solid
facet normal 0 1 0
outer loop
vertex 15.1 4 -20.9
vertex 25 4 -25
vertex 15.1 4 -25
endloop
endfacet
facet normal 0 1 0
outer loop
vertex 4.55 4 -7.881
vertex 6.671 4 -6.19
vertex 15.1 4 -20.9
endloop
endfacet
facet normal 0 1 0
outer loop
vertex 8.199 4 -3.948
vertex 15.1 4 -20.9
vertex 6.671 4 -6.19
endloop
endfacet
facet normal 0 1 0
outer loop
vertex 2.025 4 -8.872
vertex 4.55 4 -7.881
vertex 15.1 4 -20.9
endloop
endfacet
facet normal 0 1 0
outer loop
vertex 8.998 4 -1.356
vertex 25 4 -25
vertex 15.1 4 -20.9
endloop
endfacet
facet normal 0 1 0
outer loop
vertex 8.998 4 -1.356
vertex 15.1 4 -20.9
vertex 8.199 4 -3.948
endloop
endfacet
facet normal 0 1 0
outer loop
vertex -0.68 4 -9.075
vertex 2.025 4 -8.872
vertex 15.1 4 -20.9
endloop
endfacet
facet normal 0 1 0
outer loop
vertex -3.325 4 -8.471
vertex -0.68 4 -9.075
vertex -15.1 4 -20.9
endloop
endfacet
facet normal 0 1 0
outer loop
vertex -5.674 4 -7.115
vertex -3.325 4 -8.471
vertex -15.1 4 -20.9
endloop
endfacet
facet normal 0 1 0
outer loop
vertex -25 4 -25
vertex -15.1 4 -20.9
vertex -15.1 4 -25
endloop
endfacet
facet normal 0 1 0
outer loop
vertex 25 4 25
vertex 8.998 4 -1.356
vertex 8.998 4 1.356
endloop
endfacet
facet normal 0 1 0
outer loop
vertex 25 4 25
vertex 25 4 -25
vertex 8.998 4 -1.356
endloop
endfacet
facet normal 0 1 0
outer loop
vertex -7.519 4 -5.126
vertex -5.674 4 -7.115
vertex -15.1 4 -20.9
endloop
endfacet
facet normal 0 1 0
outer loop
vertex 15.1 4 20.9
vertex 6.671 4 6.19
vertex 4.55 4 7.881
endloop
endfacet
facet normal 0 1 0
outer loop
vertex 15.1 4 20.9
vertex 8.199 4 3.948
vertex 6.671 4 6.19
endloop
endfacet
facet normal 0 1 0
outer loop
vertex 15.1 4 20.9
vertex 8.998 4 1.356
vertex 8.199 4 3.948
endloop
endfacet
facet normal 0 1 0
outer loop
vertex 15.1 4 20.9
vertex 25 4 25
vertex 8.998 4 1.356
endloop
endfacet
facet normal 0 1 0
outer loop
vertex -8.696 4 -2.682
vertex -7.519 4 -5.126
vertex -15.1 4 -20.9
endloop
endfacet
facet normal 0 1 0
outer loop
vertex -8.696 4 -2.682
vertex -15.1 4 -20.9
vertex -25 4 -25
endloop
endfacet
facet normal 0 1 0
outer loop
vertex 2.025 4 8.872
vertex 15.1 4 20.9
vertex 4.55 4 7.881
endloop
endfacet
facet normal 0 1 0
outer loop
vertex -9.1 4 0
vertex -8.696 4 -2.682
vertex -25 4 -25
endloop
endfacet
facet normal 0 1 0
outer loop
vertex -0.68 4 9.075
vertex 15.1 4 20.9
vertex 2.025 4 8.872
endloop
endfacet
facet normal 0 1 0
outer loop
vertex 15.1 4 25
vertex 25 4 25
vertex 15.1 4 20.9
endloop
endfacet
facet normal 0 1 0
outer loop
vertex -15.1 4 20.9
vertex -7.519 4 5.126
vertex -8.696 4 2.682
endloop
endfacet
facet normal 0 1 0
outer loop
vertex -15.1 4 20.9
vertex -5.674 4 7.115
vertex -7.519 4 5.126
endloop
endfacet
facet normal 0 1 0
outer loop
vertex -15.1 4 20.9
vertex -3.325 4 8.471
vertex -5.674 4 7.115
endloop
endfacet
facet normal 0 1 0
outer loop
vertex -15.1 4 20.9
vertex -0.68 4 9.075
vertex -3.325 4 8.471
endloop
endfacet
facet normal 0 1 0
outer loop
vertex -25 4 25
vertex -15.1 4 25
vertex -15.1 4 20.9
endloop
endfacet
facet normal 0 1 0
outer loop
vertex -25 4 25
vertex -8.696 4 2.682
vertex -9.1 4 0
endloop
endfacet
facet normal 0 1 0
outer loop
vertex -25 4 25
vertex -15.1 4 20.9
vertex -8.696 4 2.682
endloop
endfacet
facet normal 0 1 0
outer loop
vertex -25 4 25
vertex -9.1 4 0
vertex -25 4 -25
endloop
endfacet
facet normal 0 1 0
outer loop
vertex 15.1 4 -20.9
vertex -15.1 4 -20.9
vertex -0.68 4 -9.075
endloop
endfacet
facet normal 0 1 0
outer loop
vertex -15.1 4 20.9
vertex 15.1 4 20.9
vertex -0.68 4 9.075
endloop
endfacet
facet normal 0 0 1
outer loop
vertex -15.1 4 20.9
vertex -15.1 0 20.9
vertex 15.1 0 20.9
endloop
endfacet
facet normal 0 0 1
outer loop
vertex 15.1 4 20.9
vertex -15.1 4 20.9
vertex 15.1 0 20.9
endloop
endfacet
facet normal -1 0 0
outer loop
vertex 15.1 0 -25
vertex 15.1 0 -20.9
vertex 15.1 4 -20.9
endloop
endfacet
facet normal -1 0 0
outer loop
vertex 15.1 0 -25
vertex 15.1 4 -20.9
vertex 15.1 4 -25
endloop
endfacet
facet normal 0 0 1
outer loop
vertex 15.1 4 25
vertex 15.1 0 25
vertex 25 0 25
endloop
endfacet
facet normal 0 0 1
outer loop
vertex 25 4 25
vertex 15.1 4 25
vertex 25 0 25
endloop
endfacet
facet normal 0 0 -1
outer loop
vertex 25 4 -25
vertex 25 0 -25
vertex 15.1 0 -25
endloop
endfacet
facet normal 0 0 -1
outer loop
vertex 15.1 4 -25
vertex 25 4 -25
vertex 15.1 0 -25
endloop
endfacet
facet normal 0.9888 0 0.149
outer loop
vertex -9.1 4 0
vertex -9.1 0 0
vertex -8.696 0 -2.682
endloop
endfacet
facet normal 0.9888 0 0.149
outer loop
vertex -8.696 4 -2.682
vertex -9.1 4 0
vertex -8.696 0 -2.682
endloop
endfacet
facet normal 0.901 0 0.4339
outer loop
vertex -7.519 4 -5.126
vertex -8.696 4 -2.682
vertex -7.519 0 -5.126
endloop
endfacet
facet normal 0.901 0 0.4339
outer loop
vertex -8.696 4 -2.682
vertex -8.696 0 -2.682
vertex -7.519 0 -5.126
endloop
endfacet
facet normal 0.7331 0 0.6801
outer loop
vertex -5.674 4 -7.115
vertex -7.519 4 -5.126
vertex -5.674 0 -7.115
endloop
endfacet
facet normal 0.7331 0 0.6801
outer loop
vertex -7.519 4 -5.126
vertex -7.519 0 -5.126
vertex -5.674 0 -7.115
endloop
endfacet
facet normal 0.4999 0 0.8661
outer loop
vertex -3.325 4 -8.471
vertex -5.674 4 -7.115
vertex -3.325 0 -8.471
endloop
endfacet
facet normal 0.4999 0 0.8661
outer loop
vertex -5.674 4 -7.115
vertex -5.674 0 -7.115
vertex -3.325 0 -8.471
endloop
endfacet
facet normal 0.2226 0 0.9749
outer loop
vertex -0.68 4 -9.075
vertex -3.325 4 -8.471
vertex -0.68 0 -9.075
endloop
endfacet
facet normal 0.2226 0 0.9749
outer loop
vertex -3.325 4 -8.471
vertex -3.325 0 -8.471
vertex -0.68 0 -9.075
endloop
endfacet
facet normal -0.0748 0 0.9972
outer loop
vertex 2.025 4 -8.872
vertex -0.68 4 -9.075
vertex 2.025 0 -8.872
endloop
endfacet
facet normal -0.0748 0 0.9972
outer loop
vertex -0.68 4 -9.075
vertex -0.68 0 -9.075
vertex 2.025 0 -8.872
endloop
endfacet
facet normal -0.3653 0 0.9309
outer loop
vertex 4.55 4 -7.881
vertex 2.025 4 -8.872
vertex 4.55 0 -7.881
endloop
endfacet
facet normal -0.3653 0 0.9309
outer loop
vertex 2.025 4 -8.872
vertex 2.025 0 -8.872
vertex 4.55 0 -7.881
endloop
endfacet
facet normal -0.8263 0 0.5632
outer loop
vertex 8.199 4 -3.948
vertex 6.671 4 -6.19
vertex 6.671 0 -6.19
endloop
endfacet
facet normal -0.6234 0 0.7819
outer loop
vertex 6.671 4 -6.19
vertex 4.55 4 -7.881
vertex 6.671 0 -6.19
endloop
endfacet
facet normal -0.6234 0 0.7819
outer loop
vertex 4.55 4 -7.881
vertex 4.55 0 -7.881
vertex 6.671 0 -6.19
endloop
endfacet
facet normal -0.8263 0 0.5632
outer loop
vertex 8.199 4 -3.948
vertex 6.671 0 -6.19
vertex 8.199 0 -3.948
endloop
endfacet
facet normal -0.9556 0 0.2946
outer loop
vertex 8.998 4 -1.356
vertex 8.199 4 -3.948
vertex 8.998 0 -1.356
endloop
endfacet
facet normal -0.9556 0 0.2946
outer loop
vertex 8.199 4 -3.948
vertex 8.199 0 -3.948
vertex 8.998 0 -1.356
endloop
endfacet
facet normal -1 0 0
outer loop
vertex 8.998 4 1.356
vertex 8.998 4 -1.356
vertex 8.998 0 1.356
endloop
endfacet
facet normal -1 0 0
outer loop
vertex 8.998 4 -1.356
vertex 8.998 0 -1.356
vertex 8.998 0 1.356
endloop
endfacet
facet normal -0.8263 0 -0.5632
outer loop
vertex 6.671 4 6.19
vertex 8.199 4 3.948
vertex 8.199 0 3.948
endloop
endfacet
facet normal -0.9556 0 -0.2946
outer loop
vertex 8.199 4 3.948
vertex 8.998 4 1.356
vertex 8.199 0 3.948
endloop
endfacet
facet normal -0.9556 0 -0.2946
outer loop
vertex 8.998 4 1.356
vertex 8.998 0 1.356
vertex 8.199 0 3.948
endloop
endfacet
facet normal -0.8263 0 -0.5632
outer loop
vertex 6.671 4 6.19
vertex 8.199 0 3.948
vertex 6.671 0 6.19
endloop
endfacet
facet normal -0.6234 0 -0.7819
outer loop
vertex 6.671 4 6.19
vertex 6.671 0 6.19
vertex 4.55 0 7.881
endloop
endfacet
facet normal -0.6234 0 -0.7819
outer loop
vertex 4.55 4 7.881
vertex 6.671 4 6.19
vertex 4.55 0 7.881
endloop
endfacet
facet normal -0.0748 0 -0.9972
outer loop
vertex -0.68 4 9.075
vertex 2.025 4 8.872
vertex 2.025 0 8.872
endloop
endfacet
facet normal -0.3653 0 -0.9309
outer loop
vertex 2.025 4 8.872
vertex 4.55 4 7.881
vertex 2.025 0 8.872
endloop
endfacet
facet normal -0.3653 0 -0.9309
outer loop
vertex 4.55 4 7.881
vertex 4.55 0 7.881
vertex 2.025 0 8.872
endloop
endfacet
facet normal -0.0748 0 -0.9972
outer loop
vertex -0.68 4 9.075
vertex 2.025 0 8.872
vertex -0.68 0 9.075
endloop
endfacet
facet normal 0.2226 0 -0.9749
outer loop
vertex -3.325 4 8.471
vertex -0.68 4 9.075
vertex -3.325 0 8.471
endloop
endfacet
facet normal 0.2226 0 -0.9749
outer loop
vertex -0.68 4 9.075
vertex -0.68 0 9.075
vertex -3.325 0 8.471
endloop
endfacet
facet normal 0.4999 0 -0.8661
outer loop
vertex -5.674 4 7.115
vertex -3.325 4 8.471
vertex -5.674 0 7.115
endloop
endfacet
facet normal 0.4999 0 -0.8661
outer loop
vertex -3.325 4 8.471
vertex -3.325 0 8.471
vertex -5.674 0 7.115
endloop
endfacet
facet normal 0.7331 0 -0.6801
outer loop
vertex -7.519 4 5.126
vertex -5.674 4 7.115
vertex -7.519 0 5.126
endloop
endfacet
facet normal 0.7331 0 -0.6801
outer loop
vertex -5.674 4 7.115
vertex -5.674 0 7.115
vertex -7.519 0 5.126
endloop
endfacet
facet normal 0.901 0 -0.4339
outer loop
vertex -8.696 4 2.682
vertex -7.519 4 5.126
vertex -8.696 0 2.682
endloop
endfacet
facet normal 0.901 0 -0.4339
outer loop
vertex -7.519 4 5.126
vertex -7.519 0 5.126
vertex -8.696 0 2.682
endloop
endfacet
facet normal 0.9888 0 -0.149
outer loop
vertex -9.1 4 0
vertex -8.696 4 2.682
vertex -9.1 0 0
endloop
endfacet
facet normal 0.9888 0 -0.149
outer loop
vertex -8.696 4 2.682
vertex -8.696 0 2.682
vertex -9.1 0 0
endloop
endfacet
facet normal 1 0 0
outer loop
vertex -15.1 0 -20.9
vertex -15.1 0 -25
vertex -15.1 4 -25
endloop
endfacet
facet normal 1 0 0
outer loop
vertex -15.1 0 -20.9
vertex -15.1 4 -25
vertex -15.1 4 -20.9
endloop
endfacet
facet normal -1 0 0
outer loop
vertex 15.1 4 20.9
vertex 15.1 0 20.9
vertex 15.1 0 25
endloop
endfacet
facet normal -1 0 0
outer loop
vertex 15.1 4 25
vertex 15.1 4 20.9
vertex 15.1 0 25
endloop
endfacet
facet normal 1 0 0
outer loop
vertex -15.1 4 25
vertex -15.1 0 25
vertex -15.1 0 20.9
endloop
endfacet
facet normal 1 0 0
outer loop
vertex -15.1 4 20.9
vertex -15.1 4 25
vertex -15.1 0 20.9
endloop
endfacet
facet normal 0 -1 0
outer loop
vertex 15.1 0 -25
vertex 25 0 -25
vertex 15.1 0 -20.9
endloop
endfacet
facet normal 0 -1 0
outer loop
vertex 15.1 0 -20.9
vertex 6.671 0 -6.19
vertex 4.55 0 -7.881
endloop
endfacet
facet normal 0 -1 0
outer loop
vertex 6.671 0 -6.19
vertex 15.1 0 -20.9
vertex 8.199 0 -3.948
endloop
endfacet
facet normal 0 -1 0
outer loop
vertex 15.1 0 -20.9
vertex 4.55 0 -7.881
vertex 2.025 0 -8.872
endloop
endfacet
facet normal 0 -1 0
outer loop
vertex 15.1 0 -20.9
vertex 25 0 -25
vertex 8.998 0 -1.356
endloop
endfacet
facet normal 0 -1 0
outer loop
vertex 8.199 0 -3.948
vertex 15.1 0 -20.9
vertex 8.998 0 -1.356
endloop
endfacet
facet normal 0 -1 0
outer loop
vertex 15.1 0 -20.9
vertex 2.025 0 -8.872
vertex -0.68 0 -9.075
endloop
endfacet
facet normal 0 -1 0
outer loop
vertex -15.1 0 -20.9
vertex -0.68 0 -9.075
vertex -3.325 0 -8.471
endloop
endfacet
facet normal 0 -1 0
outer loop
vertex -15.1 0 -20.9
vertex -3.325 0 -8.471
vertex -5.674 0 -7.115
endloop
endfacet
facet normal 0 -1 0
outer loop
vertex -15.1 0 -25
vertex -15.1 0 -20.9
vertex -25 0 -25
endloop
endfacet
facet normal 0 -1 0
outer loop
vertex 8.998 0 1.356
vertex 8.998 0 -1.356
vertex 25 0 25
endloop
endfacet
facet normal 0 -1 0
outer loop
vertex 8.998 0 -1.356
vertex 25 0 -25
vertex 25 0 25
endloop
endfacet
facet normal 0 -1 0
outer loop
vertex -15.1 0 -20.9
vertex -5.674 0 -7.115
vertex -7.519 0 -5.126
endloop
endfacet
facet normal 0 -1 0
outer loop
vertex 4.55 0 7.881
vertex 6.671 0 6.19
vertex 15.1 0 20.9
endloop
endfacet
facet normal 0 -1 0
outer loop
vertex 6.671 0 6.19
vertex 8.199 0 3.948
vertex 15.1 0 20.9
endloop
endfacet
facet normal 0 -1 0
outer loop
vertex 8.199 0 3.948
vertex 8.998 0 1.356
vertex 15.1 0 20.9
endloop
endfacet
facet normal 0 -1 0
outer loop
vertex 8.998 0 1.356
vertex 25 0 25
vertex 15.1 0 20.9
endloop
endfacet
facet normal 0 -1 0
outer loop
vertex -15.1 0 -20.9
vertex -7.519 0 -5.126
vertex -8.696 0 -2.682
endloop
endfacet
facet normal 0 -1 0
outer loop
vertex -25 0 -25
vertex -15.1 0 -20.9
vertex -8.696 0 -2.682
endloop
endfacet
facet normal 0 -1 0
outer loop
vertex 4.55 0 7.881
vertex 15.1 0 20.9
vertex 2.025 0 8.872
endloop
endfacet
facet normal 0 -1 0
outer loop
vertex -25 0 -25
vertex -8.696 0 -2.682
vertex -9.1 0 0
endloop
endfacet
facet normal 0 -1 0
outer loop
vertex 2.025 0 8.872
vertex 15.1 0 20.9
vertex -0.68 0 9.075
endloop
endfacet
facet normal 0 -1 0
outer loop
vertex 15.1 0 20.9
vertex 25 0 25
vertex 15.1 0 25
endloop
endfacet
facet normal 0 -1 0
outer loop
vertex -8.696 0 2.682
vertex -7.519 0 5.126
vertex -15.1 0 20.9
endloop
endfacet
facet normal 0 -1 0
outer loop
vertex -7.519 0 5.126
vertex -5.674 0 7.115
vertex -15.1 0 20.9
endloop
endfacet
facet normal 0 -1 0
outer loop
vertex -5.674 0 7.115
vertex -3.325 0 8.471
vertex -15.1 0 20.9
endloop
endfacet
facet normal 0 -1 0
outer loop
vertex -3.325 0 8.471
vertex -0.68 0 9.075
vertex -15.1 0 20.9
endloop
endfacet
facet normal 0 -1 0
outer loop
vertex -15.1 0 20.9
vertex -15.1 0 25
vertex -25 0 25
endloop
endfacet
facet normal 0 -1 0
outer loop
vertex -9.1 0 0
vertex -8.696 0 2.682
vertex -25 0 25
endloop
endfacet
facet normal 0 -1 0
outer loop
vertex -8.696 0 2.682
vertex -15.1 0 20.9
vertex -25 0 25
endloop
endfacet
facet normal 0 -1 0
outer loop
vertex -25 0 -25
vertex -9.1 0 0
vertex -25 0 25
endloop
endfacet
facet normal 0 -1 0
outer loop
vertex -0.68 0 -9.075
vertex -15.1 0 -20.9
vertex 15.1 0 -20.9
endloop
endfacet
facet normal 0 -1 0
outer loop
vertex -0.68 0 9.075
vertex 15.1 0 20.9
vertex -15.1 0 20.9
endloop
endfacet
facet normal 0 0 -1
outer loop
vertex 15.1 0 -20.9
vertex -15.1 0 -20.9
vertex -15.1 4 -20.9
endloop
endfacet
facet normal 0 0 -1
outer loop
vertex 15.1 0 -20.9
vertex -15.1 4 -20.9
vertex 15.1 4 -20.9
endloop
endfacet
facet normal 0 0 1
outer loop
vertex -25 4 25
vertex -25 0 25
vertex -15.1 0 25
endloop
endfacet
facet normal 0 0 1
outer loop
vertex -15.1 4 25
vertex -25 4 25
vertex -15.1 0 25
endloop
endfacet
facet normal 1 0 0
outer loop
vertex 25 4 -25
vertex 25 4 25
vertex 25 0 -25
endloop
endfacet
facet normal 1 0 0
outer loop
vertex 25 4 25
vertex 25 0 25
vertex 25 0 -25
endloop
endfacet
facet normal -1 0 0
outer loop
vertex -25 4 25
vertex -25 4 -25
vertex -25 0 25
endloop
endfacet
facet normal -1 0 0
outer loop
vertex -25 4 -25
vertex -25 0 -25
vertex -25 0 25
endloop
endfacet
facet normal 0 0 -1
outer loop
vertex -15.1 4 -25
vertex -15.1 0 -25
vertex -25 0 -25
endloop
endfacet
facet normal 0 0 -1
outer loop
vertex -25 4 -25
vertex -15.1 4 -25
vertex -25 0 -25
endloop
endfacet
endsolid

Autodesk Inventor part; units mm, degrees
ref_plane "YZ Plane" through (0, 0, 0) normal (1, 0, 0) x (0, 1, 0)
ref_plane "XZ Plane" through (0, 0, 0) normal (0, 1, 0) x (-1, 0, 0)
ref_plane "XY Plane" through (0, 0, 0) normal (0, 0, 1) x (1, 0, 0)
sketch "스케치1" plane through (0, 0, 0) normal (0, 1, 0) x (-1, 0, 0)
  line L0 (25, 25) -> (-25, 25)
  line L1 (-25, 25) -> (-25, -25)
  line L2 (-25, -25) -> (25, -25)
  line L3 (25, -25) -> (25, 25)
  circle A0 centre (0, 0) radius 9.1
  line L4 (15.1, 25) -> (15.1, 20.9)
  line L5 (15.1, 20.9) -> (-15.1, 20.9)
  line L6 (-15.1, 20.9) -> (-15.1, 25)
  line L7 (15.1, -25) -> (15.1, -20.9)
  line L8 (15.1, -20.9) -> (-15.1, -20.9)
  line L9 (-15.1, -20.9) -> (-15.1, -25)
  point P0 (15.1, 22.95)
  point P1 (15.1, -22.95)
  dimension "d0" = 25
  dimension "d2" = 25
  dimension "d3" = 25
  dimension "d4" = 25
  dimension "d5" = 18.2
  dimension "d6" = 30.2
  dimension "d7" = 30.2
  dimension "d8" = 9.9
  dimension "d9" = 9.9
  dimension "d10" = 4.1
  dimension "d11" = 4.1
extrude "돌출1" add sketch "스케치1" along normal blind 4 contours L3 L2 L7 L8 L9 L1 L0 L6 L5 L4
properties part number "센서 마운트"
